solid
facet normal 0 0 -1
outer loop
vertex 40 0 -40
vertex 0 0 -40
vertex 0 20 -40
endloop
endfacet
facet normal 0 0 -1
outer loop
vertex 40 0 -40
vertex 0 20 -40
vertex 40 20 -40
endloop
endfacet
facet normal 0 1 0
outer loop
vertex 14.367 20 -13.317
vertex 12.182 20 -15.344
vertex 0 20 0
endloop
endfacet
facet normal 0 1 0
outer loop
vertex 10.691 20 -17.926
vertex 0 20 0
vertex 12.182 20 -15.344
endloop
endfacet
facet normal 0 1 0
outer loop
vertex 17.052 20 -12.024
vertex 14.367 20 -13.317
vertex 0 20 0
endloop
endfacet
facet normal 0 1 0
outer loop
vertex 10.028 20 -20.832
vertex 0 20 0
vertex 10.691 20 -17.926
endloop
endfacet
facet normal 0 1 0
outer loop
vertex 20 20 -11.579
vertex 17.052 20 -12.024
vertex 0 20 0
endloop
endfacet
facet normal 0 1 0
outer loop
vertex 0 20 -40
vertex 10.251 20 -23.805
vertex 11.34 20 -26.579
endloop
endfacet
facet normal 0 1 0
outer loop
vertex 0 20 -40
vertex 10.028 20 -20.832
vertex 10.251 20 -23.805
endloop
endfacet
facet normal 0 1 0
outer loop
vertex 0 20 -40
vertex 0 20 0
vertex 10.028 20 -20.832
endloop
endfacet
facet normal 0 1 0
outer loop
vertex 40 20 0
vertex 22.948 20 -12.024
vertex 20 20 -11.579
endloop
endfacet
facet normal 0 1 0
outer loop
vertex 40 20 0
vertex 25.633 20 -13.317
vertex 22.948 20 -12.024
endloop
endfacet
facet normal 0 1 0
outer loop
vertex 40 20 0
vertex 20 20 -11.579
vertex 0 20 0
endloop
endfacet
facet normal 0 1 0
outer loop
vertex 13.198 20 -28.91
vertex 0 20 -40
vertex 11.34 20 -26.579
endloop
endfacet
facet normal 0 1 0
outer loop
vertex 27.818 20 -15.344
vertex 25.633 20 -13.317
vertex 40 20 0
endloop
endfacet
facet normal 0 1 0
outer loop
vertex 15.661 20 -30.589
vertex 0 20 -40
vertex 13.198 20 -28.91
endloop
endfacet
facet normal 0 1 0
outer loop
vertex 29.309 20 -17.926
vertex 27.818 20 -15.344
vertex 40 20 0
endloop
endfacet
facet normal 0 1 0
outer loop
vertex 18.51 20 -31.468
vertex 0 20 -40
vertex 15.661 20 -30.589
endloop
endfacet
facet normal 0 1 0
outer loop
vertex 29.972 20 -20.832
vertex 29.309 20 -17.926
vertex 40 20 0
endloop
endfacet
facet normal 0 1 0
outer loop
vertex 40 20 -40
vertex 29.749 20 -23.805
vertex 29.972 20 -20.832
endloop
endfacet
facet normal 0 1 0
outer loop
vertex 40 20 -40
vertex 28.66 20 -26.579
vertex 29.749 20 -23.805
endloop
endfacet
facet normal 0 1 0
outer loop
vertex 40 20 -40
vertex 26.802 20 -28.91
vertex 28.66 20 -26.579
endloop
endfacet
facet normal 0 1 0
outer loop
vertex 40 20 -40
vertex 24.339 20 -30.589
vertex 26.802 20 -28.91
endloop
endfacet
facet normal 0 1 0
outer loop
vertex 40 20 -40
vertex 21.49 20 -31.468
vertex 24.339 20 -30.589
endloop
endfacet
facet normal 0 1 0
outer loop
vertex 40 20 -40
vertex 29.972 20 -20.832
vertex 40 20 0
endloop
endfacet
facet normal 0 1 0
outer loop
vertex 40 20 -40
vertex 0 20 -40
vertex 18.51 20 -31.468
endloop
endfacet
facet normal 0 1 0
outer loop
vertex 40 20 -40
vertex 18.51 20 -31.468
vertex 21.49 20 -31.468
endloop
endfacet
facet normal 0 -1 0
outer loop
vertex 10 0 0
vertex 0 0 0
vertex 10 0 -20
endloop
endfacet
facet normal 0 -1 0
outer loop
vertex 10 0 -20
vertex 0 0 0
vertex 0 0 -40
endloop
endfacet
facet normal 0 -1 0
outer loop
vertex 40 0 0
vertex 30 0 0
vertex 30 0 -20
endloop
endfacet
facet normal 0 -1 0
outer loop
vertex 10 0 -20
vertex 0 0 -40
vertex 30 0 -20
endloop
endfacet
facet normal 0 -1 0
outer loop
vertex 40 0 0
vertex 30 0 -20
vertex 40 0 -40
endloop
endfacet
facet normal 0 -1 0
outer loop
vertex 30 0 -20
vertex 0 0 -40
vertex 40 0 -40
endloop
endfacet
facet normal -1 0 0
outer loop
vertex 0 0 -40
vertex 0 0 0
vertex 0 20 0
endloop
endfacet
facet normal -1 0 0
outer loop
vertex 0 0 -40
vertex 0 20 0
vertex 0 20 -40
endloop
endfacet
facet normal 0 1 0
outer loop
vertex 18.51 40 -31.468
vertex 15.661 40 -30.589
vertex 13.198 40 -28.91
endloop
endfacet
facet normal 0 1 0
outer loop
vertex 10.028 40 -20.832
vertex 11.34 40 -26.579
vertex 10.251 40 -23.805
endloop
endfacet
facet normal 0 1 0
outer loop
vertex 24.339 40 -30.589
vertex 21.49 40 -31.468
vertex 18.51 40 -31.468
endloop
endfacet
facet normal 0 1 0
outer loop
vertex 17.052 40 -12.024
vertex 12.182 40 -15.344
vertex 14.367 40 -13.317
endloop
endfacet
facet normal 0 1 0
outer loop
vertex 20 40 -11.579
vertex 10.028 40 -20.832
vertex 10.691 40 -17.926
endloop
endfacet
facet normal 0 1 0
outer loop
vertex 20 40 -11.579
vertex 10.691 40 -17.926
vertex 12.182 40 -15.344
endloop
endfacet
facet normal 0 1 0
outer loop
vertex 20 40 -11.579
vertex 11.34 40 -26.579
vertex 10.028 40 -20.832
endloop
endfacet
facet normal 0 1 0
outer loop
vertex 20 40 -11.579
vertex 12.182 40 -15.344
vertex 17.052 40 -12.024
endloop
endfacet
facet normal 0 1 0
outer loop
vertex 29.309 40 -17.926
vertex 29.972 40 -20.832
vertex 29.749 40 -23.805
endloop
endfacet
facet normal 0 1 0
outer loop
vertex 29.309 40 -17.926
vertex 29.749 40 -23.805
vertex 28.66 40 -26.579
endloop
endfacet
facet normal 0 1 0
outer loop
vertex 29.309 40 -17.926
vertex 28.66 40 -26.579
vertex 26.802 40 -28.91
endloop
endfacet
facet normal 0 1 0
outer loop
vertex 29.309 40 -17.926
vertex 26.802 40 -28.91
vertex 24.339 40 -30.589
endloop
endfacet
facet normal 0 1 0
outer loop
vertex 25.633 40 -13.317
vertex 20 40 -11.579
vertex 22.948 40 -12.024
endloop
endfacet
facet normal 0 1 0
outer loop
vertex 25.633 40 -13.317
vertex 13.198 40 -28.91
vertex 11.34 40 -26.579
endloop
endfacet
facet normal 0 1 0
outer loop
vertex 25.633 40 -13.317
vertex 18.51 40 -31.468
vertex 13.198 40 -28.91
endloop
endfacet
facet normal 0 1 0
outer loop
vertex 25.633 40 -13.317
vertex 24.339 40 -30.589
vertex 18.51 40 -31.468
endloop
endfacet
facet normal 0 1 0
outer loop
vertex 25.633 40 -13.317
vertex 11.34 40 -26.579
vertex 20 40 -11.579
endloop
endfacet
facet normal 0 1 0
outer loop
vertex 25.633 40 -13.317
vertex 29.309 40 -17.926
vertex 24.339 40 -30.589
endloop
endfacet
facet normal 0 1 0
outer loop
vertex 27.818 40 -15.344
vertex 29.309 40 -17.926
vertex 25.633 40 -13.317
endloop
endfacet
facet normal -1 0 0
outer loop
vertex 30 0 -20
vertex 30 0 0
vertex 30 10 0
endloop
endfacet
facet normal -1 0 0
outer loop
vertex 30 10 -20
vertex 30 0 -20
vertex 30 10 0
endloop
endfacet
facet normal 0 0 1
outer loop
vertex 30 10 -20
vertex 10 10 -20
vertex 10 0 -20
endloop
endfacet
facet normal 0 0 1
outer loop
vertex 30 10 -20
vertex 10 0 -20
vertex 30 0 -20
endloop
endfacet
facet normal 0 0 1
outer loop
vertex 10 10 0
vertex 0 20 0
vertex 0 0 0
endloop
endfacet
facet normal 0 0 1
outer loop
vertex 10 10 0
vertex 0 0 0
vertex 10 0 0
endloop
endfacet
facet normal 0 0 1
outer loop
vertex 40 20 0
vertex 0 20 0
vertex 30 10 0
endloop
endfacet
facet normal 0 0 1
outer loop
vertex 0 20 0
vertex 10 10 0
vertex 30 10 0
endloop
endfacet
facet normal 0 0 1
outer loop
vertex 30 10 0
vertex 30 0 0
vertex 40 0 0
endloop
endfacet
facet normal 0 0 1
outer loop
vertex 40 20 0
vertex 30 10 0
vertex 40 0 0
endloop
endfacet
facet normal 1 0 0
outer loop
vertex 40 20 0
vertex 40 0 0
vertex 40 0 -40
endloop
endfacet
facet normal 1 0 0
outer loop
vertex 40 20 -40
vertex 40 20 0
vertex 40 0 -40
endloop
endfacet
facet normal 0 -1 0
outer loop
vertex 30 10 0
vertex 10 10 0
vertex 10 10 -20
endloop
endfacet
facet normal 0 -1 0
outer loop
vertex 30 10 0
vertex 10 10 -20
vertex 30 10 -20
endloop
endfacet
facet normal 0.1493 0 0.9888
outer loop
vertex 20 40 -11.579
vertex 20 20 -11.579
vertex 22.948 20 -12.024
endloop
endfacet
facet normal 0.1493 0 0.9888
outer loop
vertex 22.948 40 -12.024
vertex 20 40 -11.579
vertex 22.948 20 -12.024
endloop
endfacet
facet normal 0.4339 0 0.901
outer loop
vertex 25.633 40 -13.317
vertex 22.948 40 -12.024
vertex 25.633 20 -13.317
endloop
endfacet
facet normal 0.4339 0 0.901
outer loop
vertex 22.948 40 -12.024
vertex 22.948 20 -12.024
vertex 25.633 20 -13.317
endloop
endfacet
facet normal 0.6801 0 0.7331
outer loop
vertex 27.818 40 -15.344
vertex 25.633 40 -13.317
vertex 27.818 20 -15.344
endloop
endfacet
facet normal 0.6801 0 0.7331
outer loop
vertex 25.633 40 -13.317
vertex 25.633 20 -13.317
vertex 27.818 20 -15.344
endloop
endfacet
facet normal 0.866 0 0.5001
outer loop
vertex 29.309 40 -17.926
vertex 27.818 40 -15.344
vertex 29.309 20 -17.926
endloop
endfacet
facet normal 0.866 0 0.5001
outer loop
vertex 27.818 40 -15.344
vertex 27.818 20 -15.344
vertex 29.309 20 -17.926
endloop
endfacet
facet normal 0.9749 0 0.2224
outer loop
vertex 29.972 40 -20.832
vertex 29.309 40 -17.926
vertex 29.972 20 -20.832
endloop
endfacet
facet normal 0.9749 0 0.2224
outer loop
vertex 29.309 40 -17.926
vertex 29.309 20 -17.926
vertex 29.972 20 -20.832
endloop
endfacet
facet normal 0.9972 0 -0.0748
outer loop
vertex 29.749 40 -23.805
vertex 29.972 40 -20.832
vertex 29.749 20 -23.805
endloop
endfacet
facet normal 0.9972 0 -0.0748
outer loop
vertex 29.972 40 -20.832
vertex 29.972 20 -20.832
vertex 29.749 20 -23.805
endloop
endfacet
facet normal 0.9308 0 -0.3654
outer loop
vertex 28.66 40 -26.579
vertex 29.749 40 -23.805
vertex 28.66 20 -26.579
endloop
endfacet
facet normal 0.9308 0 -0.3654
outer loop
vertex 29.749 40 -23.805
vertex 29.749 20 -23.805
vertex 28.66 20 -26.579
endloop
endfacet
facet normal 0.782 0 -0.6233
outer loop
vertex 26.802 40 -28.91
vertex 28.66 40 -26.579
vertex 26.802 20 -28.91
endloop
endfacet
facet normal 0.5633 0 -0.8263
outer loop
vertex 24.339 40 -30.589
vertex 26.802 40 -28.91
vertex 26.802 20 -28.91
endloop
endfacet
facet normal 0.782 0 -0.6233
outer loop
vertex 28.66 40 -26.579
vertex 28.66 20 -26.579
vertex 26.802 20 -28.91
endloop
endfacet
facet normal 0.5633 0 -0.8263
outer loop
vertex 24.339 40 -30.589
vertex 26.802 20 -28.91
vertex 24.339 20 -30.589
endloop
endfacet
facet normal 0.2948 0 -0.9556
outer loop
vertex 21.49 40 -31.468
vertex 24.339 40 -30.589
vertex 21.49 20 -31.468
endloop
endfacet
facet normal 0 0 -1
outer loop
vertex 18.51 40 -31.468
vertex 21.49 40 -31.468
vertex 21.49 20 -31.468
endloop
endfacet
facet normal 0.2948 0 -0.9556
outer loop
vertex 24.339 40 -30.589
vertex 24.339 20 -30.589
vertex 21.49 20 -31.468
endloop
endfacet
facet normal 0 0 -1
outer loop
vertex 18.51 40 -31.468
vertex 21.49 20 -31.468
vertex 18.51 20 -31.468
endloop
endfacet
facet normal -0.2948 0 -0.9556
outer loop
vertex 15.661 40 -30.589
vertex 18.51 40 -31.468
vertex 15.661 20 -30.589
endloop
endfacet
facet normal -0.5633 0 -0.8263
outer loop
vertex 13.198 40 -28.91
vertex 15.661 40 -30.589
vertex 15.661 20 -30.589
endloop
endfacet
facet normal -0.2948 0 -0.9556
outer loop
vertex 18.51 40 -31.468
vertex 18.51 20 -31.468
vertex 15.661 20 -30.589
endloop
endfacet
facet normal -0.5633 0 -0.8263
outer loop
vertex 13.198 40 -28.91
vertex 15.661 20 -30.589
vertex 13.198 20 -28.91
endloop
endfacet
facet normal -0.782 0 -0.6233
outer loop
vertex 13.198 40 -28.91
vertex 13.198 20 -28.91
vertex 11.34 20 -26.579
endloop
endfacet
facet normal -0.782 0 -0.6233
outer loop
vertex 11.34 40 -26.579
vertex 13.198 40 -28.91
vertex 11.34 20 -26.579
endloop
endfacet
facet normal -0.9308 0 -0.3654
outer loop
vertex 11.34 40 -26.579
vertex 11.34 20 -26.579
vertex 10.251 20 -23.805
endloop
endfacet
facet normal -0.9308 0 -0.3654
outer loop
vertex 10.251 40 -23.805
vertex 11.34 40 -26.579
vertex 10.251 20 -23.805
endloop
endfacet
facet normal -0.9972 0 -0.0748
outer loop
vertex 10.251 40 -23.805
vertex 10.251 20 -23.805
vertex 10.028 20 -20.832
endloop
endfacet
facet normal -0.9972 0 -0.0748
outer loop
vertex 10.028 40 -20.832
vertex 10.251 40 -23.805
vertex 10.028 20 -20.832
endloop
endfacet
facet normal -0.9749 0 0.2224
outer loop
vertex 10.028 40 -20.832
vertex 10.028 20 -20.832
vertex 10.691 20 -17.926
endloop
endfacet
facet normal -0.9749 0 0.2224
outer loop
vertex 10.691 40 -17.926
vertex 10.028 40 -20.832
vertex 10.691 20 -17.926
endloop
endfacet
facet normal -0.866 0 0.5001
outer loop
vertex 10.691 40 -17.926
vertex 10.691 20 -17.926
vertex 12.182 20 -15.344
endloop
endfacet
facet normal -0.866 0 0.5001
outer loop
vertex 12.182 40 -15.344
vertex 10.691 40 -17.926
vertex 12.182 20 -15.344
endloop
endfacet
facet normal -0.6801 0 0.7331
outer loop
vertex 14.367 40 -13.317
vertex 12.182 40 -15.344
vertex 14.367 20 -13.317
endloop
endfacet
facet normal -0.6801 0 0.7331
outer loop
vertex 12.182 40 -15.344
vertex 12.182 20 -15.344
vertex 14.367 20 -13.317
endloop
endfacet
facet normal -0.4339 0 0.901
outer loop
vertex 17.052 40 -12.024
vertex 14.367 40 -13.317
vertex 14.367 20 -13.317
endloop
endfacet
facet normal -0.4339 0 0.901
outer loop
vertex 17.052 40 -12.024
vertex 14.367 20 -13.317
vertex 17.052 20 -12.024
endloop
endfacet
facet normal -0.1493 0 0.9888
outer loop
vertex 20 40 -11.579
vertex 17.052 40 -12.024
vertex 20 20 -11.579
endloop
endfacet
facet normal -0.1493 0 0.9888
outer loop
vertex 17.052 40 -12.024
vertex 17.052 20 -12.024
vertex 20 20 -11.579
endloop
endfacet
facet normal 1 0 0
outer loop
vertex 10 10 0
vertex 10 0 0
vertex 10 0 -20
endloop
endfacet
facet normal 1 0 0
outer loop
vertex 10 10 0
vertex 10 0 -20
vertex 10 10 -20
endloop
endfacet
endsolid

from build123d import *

# Parameters (mm, degrees)
SKETCH2_W           = 40
SKETCH2_H           = 40
BOSS_EXTRUDE1_DEPTH = 20
SKETCH3_W           = 20
SKETCH3_H           = 10
CUT_EXTRUDE1_DEPTH  = 20
SKETCH6_R           = 10
BOSS_EXTRUDE2_DEPTH = 20


with BuildPart() as part:
    # Sketch2 → Boss-Extrude1 (new body)
    with BuildSketch(Plane(origin=(0, 0, 0), x_dir=(1, 0, 0), z_dir=(0, 1, 0))):
        with Locations((20, 20)):
            Rectangle(SKETCH2_W, SKETCH2_H)
    extrude(amount=BOSS_EXTRUDE1_DEPTH)

    # Sketch3 → Cut-Extrude1 (cut)
    with BuildSketch(Plane.XY):
        with Locations((20, 5)):
            Rectangle(SKETCH3_W, SKETCH3_H)
    extrude(amount=-CUT_EXTRUDE1_DEPTH, mode=Mode.SUBTRACT)

    # Sketch6 → Boss-Extrude2 (add)
    with BuildSketch(Plane(origin=(0, 20, 0), x_dir=(1, 0, 0), z_dir=(0, 1, 0))):
        with Locations(Location((20, 21.579352737, 0), (0, 0, 270))):
            Circle(SKETCH6_R)
    extrude(amount=BOSS_EXTRUDE2_DEPTH)


solid = part.part
